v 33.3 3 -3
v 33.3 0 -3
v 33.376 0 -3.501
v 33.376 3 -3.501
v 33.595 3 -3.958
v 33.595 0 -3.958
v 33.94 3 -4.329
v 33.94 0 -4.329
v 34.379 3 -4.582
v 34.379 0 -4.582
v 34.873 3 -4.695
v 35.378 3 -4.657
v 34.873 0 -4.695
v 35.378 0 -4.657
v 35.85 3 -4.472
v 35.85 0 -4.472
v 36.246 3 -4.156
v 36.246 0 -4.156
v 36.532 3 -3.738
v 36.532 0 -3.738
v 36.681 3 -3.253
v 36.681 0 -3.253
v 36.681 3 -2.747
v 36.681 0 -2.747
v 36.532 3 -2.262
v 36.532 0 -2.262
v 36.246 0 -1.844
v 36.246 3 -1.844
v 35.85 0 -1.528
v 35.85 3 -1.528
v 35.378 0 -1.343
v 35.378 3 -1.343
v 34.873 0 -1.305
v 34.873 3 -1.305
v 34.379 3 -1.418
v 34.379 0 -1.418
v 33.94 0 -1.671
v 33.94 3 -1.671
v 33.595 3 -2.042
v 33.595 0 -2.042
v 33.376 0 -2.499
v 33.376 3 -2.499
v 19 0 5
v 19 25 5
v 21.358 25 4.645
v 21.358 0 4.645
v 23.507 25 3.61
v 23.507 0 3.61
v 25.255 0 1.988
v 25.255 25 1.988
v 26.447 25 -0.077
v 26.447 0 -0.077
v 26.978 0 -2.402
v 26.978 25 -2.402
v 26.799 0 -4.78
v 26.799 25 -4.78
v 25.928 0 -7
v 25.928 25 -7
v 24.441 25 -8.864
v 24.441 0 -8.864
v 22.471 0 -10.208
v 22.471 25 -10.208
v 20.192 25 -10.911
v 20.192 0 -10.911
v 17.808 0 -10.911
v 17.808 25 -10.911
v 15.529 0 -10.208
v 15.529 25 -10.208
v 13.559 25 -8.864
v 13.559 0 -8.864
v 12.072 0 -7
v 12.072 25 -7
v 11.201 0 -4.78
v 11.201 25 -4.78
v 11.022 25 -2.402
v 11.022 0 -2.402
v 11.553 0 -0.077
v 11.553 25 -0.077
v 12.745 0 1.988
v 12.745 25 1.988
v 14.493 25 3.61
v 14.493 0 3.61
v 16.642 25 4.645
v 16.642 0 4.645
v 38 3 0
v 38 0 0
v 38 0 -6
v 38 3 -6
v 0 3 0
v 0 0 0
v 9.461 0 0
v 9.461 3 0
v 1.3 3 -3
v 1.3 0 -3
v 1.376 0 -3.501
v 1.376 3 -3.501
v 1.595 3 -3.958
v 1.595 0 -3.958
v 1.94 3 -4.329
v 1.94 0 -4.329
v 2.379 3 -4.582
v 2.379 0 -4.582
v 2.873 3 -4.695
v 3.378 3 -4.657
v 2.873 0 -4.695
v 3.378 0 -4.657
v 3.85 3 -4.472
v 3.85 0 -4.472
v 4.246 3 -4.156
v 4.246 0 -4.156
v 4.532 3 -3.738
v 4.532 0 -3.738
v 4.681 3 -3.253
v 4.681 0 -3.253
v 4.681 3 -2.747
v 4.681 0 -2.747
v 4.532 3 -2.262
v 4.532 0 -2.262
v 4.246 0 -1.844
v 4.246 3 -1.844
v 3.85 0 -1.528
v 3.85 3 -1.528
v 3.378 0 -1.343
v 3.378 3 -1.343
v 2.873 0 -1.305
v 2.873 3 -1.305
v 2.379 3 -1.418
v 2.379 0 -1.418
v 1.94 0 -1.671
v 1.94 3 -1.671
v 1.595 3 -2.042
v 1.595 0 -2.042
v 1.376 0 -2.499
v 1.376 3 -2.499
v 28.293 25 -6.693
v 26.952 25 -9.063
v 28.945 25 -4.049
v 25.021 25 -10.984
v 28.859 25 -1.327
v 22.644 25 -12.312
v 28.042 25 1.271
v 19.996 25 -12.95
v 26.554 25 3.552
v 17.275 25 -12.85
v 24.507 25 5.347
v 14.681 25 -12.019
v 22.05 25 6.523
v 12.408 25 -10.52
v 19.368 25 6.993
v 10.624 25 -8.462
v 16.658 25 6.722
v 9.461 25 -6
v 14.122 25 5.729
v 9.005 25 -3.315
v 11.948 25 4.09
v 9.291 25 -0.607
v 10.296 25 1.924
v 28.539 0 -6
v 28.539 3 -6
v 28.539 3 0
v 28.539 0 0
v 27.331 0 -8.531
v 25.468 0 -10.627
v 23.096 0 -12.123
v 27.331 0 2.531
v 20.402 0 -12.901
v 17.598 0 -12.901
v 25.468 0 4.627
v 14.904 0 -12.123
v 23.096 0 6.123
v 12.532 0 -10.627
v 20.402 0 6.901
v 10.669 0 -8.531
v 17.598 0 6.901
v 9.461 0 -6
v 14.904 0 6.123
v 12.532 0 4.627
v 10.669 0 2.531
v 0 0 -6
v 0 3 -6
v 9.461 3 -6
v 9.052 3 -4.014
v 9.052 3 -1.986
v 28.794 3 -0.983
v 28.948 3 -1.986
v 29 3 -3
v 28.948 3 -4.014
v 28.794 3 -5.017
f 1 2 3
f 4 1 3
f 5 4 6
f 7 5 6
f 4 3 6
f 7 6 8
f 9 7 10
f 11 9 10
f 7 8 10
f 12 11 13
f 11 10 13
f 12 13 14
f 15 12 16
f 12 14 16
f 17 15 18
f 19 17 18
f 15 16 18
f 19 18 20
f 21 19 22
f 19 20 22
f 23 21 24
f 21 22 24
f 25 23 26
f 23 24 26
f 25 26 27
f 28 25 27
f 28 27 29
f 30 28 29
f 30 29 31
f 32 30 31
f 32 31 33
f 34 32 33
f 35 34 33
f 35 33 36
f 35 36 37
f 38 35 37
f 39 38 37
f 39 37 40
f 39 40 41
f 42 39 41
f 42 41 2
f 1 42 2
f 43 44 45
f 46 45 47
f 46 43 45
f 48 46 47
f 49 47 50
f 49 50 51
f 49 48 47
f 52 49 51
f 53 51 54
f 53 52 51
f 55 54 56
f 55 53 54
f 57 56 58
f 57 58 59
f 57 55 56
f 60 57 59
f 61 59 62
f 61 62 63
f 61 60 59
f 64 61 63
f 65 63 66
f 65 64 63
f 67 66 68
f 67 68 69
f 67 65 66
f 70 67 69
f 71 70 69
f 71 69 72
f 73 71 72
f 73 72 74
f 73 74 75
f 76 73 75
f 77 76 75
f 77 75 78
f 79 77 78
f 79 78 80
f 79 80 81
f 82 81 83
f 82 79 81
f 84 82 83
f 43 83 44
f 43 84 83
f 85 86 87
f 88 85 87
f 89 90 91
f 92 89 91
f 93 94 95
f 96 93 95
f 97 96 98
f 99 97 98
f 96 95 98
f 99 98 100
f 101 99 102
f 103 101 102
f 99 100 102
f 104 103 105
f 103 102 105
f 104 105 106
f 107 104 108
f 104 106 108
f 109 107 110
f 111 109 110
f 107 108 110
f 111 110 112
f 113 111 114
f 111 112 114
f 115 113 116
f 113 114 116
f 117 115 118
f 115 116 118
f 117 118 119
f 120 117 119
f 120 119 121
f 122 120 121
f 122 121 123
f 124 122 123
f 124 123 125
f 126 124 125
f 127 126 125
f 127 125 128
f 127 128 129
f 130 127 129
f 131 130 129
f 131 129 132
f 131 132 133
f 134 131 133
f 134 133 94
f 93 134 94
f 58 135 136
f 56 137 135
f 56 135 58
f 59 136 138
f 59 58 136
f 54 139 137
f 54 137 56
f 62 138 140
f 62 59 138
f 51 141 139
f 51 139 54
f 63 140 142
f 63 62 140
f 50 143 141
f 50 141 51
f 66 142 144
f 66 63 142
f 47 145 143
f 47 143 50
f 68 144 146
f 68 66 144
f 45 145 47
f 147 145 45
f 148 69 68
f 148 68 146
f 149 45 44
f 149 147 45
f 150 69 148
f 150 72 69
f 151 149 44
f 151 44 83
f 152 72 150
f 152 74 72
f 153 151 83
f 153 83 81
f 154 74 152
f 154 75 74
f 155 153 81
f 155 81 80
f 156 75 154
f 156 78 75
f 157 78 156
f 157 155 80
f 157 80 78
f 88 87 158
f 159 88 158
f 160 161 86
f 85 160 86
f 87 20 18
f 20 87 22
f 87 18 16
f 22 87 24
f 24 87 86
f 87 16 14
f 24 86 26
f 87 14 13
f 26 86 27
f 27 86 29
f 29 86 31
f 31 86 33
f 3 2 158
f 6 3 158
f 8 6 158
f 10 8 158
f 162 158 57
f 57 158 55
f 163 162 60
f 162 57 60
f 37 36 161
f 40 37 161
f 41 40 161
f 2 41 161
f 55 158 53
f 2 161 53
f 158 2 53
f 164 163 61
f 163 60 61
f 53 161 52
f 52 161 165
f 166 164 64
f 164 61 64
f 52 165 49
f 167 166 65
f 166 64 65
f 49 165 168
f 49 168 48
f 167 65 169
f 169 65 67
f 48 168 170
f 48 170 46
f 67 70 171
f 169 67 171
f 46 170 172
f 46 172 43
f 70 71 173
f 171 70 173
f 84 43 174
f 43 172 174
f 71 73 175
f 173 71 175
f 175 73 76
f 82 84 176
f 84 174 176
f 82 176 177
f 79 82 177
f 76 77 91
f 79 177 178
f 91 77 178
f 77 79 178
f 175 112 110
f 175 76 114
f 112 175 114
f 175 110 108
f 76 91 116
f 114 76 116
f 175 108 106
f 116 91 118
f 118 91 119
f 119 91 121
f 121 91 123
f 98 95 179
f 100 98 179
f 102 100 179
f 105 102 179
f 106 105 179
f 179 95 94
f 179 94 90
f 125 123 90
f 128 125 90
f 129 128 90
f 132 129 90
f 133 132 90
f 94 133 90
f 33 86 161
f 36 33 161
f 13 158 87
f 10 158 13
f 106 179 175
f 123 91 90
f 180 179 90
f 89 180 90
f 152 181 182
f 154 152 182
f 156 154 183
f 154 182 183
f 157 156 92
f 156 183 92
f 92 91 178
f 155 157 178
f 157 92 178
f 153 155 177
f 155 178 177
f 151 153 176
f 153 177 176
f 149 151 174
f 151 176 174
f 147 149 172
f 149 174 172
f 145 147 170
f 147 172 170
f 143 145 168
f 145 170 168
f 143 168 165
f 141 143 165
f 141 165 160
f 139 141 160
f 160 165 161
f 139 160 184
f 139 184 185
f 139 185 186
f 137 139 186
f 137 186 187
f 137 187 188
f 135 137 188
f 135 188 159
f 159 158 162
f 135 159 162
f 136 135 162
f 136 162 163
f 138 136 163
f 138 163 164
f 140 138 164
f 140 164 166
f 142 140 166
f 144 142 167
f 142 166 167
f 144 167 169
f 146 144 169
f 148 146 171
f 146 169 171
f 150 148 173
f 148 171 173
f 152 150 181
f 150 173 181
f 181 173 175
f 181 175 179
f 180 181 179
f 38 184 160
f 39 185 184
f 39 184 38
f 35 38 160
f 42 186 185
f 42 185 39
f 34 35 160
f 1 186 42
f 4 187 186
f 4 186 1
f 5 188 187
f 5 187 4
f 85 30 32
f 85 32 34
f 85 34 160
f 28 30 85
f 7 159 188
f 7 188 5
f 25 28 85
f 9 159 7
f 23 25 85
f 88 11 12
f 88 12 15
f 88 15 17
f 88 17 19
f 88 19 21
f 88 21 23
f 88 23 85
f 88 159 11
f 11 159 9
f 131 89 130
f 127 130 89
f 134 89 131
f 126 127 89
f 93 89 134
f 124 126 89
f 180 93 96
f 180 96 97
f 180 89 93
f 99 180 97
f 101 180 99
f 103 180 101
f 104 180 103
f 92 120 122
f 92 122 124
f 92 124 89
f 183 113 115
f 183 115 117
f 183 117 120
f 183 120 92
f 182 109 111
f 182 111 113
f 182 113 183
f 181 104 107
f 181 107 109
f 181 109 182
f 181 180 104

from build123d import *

# Parameters (mm, degrees)
BOSS_EXTRUDE1_DEPTH   = 3
BOSS_EXTRUDE1_2_DEPTH = 3
SKETCH1_3_R           = 8
BOSS_EXTRUDE2_DEPTH   = 25
M3_CLEARANCE_HOLE1_D  = 3.4


with BuildPart() as part:
    # Sketch1 → Boss-Extrude1 (new body)
    with BuildSketch(Plane(origin=(0, 0, 0), x_dir=(1, 0, 0), z_dir=(0, 1, 0))):
        with BuildLine():
            ThreePointArc((28.539392014, 6), (29, 3), (28.539392014, 0))
            Line((28.539392014, 0), (38, 0))
            Line((38, 0), (38, 6))
            Line((38, 6), (28.539392014, 6))
        make_face()
    extrude(amount=BOSS_EXTRUDE1_DEPTH)



with BuildPart() as body_2:
    # Sketch1 → Boss-Extrude1 2 (new body)
    with BuildSketch(Plane(origin=(0, 0, 0), x_dir=(1, 0, 0), z_dir=(0, 1, 0))):
        with BuildLine():
            Line((0, 0), (9.460607986, 0))
            ThreePointArc((9.460607986, 0), (9, 3), (9.460607986, 6))
            Line((9.460607986, 6), (0, 6))
            Line((0, 6), (0, 0))
        make_face()
    extrude(amount=BOSS_EXTRUDE1_2_DEPTH)


with BuildPart() as part_1:
    add(part.part)

    add(body_2.part)  # Boss-Extrude2 merges body 2
    # Sketch1<3> → Boss-Extrude2 (add)
    with BuildSketch(Plane(origin=(0, 0, 0), x_dir=(1, 0, 0), z_dir=(0, 1, 0))):
        with BuildLine():
            ThreePointArc((9.460607986, 0), (19, -7), (28.539392014, 0))
            ThreePointArc((28.539392014, 0), (28.884177258, 1.482423007), (29, 3))
            ThreePointArc((29, 3), (28.884177258, 4.517576993), (28.539392014, 6))
            ThreePointArc((28.539392014, 6), (19, 13), (9.460607986, 6))
            ThreePointArc((9.460607986, 6), (9, 3), (9.460607986, 0))
        make_face()
        with Locations((19, 3)):
            Circle(SKETCH1_3_R, mode=Mode.SUBTRACT)
    extrude(amount=BOSS_EXTRUDE2_DEPTH)

    # M3 Clearance Hole1 (through all)
    with Locations(Plane(origin=(0, 3, 0), x_dir=(1, 0, 0), z_dir=(0, 1, 0))):
        with Locations((3, 3), (35, 3)):
            Hole(M3_CLEARANCE_HOLE1_D / 2)


solid = part_1.part
